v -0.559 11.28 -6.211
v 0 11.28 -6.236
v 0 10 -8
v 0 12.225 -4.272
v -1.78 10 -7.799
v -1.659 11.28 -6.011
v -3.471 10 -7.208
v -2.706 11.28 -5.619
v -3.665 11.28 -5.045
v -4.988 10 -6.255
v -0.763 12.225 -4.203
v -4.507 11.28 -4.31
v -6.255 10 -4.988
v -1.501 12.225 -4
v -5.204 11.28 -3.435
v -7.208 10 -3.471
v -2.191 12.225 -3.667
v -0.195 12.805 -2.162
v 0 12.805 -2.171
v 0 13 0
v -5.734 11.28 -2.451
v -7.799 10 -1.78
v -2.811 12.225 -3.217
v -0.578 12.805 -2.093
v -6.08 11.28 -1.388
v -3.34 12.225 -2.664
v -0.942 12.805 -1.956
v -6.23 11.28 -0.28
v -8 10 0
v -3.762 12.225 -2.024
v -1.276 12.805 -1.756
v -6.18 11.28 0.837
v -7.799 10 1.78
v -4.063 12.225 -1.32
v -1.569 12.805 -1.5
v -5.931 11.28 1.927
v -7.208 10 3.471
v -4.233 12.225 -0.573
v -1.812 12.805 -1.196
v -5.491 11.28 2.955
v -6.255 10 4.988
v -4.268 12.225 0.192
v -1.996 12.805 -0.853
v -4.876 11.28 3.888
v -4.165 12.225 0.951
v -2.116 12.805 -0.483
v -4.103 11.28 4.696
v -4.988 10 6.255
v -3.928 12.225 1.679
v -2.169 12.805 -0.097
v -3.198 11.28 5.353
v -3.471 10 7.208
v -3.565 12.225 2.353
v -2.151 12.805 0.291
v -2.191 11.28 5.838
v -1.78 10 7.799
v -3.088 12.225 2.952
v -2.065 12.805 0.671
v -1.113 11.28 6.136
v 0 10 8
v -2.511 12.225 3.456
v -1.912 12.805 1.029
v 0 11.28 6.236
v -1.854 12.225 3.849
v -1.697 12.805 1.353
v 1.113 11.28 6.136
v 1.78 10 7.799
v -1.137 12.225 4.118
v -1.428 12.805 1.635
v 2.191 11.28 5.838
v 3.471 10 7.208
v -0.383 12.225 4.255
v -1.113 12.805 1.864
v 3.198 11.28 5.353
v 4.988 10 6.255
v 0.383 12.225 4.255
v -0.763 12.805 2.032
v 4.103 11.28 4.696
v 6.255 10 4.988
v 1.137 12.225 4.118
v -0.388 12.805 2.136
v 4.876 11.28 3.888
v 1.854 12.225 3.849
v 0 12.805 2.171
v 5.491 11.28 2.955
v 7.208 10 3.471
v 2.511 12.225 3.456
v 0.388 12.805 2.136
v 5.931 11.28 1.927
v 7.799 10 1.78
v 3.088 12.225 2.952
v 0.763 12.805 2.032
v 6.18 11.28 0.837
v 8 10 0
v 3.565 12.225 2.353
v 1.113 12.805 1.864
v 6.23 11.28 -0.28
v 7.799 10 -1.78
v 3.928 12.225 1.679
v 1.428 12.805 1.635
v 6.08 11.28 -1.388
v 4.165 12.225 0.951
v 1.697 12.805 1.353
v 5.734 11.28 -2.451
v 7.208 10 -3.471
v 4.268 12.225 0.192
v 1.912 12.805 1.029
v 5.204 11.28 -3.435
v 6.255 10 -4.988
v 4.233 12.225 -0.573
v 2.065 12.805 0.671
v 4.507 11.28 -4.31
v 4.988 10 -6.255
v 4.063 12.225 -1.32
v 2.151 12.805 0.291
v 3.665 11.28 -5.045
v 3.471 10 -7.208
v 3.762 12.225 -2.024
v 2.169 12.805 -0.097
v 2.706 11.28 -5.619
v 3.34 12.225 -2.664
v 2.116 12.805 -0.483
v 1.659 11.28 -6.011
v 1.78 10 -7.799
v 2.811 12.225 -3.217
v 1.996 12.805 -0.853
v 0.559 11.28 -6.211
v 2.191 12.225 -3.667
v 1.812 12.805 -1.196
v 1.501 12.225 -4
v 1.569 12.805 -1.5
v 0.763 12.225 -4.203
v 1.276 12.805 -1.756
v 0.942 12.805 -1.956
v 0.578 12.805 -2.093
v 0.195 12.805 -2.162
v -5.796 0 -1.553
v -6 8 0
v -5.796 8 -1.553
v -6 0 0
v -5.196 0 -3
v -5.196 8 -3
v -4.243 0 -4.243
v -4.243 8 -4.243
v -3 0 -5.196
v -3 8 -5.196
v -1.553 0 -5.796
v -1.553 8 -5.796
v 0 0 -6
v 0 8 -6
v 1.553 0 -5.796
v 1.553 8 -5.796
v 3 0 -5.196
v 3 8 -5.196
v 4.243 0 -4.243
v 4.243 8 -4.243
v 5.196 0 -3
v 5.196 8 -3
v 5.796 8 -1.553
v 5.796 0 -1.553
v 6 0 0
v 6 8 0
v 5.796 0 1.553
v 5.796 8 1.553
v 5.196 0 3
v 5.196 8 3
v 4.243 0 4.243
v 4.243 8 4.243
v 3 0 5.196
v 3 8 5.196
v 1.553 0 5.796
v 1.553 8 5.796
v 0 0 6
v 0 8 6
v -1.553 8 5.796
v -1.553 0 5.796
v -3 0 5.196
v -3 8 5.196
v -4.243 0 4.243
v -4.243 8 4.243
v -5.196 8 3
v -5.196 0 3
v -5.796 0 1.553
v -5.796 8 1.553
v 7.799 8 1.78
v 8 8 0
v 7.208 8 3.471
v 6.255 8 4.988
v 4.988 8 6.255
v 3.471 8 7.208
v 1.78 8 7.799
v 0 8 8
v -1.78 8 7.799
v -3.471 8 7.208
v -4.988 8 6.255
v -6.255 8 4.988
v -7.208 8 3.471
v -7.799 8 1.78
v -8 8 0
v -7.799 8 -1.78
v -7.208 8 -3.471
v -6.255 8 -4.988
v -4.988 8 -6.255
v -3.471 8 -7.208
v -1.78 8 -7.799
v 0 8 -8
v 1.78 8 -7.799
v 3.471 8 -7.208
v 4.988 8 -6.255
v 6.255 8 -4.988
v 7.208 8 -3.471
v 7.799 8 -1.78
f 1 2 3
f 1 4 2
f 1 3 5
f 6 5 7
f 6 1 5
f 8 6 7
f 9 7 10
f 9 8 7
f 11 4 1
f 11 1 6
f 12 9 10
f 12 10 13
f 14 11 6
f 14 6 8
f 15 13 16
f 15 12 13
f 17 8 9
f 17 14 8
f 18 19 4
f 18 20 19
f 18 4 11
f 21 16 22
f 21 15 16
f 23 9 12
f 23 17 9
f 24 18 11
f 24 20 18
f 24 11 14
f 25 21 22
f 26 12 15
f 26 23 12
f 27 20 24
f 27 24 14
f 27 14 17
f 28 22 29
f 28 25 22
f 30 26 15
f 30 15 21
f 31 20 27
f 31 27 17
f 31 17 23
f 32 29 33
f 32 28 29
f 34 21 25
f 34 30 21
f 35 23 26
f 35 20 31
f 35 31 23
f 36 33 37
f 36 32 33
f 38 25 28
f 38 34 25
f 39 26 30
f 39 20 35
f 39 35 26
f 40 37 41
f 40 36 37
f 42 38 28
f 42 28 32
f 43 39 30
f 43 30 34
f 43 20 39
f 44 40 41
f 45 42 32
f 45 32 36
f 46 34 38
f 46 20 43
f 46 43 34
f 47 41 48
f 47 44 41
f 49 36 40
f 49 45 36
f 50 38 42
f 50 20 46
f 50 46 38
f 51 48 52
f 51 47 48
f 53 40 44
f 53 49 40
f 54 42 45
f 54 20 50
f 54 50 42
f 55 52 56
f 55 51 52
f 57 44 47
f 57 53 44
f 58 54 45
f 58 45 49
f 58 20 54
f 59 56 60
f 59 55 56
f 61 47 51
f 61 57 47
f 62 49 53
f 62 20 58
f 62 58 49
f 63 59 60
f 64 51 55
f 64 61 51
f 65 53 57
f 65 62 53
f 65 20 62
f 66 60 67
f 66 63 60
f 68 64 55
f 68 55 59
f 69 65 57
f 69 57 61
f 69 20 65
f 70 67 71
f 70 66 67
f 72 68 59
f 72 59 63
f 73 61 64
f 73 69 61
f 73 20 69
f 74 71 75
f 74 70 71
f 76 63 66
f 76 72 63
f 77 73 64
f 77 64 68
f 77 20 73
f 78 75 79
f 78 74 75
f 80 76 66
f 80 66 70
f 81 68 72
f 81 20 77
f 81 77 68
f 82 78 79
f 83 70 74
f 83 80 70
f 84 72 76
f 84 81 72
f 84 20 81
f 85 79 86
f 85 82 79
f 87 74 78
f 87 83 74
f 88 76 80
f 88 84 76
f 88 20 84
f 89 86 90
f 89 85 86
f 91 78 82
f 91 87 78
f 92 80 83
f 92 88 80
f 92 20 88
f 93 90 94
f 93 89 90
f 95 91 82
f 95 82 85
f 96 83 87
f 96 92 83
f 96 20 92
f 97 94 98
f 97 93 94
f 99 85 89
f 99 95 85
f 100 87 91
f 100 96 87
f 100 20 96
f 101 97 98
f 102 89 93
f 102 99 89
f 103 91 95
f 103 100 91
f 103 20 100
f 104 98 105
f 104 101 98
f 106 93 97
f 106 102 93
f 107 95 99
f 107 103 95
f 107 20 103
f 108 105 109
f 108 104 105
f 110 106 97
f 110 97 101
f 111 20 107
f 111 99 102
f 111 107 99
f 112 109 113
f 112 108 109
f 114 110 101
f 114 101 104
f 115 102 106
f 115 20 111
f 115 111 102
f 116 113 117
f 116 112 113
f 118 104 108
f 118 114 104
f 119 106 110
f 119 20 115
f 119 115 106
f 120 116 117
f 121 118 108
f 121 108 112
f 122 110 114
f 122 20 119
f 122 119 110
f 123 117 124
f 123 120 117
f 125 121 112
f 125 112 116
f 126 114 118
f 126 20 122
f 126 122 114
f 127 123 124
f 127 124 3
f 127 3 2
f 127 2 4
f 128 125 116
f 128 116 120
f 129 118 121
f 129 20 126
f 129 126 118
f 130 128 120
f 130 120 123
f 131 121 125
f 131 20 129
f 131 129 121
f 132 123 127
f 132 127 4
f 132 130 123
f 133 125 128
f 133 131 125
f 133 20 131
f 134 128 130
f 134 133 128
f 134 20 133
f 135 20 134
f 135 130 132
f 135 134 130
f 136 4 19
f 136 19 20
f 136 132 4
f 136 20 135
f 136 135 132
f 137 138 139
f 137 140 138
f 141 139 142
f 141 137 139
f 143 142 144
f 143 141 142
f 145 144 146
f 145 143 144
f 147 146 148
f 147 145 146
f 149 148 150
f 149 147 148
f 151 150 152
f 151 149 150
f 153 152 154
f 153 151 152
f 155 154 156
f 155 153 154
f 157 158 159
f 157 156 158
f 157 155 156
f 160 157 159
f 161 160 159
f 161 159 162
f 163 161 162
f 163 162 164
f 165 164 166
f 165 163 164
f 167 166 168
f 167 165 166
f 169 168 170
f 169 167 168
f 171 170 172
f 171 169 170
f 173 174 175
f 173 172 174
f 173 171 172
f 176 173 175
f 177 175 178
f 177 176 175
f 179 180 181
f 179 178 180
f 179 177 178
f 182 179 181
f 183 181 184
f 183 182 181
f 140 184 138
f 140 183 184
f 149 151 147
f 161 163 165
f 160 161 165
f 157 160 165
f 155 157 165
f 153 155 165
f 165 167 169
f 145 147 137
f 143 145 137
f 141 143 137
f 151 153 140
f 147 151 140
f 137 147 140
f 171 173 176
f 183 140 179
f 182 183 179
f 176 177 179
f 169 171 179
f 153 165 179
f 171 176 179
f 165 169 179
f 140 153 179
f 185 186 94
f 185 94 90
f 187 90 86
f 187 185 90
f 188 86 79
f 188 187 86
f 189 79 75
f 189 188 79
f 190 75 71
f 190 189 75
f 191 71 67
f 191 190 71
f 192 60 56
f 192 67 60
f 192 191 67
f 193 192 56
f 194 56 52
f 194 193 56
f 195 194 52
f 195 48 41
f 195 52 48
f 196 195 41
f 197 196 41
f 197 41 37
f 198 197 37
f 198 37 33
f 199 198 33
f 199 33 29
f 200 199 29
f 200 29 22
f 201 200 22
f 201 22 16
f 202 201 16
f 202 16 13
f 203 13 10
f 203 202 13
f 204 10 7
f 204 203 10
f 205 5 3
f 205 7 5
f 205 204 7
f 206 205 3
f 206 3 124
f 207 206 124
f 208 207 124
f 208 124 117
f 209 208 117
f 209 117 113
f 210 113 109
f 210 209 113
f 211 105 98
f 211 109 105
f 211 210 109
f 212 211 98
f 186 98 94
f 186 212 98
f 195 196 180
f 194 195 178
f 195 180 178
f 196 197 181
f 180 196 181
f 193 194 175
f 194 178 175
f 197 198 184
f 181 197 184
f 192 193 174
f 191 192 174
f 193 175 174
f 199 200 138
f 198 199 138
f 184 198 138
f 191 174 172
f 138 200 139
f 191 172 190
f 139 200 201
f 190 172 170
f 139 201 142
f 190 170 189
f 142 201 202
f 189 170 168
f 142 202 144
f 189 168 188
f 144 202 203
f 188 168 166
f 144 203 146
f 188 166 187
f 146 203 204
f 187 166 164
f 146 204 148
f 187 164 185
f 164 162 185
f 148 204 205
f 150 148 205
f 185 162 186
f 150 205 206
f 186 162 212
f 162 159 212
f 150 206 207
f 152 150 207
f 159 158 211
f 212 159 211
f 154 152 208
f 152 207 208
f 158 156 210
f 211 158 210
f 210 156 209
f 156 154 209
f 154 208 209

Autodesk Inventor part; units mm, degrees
ref_plane "YZ Plane" through (0, 0, 0) normal (1, 0, 0) x (0, 1, 0)
ref_plane "XZ Plane" through (0, 0, 0) normal (0, 1, 0) x (-1, 0, 0)
ref_plane "XY Plane" through (0, 0, 0) normal (0, 0, 1) x (1, 0, 0)
sketch "Sketch1" plane through (0, 0, 0) normal (0, 1, 0) x (-1, 0, 0)
  circle A0 centre (0, 0) radius 6
  dimension "d0" = 12
extrude "Extrusion1" add sketch "Sketch1" along normal blind 8
sketch "Sketch2" plane through (0, 8, 0) normal (0, 1, 0) x (1, 0, 0)
  circle A0 centre (0, 0) radius 8
  dimension "d3" = 16
extrude "Extrusion2" add sketch "Sketch2" along normal blind 5
sketch "Sketch3" plane through (0, 0, 0) normal (1, 0, 0) x (0, 1, 0)
  line L0 (13, -8) -> (13, 8) projected
  line L1 (8, -8) -> (8, 8) projected
  line L2 (8, 8) -> (13, 8) projected
  line L3 (8, -8) -> (13, -8) projected
  line L4 (8, 8) -> (10, 8)
  line L5 (10, 8) -> (10, 0)
  line L6 (10, 0) -> (13, 0)
  line L7 (13, -8) -> (13, 8) projected
  line L8 (10, 0) -> (10, -8)
  arc A0 (10, -8) -> (10, 8) centre (0.8333, 0) ccw
  point P0 (0, 0)
  dimension "d6" = 2
revolve "Revolution1" cut sketch "Sketch3" angle 360 about axis through (0, 10, 0) along (0, 1, 0) contours L3 A0 L0 | A0 L2 L0
properties part number "lense"
